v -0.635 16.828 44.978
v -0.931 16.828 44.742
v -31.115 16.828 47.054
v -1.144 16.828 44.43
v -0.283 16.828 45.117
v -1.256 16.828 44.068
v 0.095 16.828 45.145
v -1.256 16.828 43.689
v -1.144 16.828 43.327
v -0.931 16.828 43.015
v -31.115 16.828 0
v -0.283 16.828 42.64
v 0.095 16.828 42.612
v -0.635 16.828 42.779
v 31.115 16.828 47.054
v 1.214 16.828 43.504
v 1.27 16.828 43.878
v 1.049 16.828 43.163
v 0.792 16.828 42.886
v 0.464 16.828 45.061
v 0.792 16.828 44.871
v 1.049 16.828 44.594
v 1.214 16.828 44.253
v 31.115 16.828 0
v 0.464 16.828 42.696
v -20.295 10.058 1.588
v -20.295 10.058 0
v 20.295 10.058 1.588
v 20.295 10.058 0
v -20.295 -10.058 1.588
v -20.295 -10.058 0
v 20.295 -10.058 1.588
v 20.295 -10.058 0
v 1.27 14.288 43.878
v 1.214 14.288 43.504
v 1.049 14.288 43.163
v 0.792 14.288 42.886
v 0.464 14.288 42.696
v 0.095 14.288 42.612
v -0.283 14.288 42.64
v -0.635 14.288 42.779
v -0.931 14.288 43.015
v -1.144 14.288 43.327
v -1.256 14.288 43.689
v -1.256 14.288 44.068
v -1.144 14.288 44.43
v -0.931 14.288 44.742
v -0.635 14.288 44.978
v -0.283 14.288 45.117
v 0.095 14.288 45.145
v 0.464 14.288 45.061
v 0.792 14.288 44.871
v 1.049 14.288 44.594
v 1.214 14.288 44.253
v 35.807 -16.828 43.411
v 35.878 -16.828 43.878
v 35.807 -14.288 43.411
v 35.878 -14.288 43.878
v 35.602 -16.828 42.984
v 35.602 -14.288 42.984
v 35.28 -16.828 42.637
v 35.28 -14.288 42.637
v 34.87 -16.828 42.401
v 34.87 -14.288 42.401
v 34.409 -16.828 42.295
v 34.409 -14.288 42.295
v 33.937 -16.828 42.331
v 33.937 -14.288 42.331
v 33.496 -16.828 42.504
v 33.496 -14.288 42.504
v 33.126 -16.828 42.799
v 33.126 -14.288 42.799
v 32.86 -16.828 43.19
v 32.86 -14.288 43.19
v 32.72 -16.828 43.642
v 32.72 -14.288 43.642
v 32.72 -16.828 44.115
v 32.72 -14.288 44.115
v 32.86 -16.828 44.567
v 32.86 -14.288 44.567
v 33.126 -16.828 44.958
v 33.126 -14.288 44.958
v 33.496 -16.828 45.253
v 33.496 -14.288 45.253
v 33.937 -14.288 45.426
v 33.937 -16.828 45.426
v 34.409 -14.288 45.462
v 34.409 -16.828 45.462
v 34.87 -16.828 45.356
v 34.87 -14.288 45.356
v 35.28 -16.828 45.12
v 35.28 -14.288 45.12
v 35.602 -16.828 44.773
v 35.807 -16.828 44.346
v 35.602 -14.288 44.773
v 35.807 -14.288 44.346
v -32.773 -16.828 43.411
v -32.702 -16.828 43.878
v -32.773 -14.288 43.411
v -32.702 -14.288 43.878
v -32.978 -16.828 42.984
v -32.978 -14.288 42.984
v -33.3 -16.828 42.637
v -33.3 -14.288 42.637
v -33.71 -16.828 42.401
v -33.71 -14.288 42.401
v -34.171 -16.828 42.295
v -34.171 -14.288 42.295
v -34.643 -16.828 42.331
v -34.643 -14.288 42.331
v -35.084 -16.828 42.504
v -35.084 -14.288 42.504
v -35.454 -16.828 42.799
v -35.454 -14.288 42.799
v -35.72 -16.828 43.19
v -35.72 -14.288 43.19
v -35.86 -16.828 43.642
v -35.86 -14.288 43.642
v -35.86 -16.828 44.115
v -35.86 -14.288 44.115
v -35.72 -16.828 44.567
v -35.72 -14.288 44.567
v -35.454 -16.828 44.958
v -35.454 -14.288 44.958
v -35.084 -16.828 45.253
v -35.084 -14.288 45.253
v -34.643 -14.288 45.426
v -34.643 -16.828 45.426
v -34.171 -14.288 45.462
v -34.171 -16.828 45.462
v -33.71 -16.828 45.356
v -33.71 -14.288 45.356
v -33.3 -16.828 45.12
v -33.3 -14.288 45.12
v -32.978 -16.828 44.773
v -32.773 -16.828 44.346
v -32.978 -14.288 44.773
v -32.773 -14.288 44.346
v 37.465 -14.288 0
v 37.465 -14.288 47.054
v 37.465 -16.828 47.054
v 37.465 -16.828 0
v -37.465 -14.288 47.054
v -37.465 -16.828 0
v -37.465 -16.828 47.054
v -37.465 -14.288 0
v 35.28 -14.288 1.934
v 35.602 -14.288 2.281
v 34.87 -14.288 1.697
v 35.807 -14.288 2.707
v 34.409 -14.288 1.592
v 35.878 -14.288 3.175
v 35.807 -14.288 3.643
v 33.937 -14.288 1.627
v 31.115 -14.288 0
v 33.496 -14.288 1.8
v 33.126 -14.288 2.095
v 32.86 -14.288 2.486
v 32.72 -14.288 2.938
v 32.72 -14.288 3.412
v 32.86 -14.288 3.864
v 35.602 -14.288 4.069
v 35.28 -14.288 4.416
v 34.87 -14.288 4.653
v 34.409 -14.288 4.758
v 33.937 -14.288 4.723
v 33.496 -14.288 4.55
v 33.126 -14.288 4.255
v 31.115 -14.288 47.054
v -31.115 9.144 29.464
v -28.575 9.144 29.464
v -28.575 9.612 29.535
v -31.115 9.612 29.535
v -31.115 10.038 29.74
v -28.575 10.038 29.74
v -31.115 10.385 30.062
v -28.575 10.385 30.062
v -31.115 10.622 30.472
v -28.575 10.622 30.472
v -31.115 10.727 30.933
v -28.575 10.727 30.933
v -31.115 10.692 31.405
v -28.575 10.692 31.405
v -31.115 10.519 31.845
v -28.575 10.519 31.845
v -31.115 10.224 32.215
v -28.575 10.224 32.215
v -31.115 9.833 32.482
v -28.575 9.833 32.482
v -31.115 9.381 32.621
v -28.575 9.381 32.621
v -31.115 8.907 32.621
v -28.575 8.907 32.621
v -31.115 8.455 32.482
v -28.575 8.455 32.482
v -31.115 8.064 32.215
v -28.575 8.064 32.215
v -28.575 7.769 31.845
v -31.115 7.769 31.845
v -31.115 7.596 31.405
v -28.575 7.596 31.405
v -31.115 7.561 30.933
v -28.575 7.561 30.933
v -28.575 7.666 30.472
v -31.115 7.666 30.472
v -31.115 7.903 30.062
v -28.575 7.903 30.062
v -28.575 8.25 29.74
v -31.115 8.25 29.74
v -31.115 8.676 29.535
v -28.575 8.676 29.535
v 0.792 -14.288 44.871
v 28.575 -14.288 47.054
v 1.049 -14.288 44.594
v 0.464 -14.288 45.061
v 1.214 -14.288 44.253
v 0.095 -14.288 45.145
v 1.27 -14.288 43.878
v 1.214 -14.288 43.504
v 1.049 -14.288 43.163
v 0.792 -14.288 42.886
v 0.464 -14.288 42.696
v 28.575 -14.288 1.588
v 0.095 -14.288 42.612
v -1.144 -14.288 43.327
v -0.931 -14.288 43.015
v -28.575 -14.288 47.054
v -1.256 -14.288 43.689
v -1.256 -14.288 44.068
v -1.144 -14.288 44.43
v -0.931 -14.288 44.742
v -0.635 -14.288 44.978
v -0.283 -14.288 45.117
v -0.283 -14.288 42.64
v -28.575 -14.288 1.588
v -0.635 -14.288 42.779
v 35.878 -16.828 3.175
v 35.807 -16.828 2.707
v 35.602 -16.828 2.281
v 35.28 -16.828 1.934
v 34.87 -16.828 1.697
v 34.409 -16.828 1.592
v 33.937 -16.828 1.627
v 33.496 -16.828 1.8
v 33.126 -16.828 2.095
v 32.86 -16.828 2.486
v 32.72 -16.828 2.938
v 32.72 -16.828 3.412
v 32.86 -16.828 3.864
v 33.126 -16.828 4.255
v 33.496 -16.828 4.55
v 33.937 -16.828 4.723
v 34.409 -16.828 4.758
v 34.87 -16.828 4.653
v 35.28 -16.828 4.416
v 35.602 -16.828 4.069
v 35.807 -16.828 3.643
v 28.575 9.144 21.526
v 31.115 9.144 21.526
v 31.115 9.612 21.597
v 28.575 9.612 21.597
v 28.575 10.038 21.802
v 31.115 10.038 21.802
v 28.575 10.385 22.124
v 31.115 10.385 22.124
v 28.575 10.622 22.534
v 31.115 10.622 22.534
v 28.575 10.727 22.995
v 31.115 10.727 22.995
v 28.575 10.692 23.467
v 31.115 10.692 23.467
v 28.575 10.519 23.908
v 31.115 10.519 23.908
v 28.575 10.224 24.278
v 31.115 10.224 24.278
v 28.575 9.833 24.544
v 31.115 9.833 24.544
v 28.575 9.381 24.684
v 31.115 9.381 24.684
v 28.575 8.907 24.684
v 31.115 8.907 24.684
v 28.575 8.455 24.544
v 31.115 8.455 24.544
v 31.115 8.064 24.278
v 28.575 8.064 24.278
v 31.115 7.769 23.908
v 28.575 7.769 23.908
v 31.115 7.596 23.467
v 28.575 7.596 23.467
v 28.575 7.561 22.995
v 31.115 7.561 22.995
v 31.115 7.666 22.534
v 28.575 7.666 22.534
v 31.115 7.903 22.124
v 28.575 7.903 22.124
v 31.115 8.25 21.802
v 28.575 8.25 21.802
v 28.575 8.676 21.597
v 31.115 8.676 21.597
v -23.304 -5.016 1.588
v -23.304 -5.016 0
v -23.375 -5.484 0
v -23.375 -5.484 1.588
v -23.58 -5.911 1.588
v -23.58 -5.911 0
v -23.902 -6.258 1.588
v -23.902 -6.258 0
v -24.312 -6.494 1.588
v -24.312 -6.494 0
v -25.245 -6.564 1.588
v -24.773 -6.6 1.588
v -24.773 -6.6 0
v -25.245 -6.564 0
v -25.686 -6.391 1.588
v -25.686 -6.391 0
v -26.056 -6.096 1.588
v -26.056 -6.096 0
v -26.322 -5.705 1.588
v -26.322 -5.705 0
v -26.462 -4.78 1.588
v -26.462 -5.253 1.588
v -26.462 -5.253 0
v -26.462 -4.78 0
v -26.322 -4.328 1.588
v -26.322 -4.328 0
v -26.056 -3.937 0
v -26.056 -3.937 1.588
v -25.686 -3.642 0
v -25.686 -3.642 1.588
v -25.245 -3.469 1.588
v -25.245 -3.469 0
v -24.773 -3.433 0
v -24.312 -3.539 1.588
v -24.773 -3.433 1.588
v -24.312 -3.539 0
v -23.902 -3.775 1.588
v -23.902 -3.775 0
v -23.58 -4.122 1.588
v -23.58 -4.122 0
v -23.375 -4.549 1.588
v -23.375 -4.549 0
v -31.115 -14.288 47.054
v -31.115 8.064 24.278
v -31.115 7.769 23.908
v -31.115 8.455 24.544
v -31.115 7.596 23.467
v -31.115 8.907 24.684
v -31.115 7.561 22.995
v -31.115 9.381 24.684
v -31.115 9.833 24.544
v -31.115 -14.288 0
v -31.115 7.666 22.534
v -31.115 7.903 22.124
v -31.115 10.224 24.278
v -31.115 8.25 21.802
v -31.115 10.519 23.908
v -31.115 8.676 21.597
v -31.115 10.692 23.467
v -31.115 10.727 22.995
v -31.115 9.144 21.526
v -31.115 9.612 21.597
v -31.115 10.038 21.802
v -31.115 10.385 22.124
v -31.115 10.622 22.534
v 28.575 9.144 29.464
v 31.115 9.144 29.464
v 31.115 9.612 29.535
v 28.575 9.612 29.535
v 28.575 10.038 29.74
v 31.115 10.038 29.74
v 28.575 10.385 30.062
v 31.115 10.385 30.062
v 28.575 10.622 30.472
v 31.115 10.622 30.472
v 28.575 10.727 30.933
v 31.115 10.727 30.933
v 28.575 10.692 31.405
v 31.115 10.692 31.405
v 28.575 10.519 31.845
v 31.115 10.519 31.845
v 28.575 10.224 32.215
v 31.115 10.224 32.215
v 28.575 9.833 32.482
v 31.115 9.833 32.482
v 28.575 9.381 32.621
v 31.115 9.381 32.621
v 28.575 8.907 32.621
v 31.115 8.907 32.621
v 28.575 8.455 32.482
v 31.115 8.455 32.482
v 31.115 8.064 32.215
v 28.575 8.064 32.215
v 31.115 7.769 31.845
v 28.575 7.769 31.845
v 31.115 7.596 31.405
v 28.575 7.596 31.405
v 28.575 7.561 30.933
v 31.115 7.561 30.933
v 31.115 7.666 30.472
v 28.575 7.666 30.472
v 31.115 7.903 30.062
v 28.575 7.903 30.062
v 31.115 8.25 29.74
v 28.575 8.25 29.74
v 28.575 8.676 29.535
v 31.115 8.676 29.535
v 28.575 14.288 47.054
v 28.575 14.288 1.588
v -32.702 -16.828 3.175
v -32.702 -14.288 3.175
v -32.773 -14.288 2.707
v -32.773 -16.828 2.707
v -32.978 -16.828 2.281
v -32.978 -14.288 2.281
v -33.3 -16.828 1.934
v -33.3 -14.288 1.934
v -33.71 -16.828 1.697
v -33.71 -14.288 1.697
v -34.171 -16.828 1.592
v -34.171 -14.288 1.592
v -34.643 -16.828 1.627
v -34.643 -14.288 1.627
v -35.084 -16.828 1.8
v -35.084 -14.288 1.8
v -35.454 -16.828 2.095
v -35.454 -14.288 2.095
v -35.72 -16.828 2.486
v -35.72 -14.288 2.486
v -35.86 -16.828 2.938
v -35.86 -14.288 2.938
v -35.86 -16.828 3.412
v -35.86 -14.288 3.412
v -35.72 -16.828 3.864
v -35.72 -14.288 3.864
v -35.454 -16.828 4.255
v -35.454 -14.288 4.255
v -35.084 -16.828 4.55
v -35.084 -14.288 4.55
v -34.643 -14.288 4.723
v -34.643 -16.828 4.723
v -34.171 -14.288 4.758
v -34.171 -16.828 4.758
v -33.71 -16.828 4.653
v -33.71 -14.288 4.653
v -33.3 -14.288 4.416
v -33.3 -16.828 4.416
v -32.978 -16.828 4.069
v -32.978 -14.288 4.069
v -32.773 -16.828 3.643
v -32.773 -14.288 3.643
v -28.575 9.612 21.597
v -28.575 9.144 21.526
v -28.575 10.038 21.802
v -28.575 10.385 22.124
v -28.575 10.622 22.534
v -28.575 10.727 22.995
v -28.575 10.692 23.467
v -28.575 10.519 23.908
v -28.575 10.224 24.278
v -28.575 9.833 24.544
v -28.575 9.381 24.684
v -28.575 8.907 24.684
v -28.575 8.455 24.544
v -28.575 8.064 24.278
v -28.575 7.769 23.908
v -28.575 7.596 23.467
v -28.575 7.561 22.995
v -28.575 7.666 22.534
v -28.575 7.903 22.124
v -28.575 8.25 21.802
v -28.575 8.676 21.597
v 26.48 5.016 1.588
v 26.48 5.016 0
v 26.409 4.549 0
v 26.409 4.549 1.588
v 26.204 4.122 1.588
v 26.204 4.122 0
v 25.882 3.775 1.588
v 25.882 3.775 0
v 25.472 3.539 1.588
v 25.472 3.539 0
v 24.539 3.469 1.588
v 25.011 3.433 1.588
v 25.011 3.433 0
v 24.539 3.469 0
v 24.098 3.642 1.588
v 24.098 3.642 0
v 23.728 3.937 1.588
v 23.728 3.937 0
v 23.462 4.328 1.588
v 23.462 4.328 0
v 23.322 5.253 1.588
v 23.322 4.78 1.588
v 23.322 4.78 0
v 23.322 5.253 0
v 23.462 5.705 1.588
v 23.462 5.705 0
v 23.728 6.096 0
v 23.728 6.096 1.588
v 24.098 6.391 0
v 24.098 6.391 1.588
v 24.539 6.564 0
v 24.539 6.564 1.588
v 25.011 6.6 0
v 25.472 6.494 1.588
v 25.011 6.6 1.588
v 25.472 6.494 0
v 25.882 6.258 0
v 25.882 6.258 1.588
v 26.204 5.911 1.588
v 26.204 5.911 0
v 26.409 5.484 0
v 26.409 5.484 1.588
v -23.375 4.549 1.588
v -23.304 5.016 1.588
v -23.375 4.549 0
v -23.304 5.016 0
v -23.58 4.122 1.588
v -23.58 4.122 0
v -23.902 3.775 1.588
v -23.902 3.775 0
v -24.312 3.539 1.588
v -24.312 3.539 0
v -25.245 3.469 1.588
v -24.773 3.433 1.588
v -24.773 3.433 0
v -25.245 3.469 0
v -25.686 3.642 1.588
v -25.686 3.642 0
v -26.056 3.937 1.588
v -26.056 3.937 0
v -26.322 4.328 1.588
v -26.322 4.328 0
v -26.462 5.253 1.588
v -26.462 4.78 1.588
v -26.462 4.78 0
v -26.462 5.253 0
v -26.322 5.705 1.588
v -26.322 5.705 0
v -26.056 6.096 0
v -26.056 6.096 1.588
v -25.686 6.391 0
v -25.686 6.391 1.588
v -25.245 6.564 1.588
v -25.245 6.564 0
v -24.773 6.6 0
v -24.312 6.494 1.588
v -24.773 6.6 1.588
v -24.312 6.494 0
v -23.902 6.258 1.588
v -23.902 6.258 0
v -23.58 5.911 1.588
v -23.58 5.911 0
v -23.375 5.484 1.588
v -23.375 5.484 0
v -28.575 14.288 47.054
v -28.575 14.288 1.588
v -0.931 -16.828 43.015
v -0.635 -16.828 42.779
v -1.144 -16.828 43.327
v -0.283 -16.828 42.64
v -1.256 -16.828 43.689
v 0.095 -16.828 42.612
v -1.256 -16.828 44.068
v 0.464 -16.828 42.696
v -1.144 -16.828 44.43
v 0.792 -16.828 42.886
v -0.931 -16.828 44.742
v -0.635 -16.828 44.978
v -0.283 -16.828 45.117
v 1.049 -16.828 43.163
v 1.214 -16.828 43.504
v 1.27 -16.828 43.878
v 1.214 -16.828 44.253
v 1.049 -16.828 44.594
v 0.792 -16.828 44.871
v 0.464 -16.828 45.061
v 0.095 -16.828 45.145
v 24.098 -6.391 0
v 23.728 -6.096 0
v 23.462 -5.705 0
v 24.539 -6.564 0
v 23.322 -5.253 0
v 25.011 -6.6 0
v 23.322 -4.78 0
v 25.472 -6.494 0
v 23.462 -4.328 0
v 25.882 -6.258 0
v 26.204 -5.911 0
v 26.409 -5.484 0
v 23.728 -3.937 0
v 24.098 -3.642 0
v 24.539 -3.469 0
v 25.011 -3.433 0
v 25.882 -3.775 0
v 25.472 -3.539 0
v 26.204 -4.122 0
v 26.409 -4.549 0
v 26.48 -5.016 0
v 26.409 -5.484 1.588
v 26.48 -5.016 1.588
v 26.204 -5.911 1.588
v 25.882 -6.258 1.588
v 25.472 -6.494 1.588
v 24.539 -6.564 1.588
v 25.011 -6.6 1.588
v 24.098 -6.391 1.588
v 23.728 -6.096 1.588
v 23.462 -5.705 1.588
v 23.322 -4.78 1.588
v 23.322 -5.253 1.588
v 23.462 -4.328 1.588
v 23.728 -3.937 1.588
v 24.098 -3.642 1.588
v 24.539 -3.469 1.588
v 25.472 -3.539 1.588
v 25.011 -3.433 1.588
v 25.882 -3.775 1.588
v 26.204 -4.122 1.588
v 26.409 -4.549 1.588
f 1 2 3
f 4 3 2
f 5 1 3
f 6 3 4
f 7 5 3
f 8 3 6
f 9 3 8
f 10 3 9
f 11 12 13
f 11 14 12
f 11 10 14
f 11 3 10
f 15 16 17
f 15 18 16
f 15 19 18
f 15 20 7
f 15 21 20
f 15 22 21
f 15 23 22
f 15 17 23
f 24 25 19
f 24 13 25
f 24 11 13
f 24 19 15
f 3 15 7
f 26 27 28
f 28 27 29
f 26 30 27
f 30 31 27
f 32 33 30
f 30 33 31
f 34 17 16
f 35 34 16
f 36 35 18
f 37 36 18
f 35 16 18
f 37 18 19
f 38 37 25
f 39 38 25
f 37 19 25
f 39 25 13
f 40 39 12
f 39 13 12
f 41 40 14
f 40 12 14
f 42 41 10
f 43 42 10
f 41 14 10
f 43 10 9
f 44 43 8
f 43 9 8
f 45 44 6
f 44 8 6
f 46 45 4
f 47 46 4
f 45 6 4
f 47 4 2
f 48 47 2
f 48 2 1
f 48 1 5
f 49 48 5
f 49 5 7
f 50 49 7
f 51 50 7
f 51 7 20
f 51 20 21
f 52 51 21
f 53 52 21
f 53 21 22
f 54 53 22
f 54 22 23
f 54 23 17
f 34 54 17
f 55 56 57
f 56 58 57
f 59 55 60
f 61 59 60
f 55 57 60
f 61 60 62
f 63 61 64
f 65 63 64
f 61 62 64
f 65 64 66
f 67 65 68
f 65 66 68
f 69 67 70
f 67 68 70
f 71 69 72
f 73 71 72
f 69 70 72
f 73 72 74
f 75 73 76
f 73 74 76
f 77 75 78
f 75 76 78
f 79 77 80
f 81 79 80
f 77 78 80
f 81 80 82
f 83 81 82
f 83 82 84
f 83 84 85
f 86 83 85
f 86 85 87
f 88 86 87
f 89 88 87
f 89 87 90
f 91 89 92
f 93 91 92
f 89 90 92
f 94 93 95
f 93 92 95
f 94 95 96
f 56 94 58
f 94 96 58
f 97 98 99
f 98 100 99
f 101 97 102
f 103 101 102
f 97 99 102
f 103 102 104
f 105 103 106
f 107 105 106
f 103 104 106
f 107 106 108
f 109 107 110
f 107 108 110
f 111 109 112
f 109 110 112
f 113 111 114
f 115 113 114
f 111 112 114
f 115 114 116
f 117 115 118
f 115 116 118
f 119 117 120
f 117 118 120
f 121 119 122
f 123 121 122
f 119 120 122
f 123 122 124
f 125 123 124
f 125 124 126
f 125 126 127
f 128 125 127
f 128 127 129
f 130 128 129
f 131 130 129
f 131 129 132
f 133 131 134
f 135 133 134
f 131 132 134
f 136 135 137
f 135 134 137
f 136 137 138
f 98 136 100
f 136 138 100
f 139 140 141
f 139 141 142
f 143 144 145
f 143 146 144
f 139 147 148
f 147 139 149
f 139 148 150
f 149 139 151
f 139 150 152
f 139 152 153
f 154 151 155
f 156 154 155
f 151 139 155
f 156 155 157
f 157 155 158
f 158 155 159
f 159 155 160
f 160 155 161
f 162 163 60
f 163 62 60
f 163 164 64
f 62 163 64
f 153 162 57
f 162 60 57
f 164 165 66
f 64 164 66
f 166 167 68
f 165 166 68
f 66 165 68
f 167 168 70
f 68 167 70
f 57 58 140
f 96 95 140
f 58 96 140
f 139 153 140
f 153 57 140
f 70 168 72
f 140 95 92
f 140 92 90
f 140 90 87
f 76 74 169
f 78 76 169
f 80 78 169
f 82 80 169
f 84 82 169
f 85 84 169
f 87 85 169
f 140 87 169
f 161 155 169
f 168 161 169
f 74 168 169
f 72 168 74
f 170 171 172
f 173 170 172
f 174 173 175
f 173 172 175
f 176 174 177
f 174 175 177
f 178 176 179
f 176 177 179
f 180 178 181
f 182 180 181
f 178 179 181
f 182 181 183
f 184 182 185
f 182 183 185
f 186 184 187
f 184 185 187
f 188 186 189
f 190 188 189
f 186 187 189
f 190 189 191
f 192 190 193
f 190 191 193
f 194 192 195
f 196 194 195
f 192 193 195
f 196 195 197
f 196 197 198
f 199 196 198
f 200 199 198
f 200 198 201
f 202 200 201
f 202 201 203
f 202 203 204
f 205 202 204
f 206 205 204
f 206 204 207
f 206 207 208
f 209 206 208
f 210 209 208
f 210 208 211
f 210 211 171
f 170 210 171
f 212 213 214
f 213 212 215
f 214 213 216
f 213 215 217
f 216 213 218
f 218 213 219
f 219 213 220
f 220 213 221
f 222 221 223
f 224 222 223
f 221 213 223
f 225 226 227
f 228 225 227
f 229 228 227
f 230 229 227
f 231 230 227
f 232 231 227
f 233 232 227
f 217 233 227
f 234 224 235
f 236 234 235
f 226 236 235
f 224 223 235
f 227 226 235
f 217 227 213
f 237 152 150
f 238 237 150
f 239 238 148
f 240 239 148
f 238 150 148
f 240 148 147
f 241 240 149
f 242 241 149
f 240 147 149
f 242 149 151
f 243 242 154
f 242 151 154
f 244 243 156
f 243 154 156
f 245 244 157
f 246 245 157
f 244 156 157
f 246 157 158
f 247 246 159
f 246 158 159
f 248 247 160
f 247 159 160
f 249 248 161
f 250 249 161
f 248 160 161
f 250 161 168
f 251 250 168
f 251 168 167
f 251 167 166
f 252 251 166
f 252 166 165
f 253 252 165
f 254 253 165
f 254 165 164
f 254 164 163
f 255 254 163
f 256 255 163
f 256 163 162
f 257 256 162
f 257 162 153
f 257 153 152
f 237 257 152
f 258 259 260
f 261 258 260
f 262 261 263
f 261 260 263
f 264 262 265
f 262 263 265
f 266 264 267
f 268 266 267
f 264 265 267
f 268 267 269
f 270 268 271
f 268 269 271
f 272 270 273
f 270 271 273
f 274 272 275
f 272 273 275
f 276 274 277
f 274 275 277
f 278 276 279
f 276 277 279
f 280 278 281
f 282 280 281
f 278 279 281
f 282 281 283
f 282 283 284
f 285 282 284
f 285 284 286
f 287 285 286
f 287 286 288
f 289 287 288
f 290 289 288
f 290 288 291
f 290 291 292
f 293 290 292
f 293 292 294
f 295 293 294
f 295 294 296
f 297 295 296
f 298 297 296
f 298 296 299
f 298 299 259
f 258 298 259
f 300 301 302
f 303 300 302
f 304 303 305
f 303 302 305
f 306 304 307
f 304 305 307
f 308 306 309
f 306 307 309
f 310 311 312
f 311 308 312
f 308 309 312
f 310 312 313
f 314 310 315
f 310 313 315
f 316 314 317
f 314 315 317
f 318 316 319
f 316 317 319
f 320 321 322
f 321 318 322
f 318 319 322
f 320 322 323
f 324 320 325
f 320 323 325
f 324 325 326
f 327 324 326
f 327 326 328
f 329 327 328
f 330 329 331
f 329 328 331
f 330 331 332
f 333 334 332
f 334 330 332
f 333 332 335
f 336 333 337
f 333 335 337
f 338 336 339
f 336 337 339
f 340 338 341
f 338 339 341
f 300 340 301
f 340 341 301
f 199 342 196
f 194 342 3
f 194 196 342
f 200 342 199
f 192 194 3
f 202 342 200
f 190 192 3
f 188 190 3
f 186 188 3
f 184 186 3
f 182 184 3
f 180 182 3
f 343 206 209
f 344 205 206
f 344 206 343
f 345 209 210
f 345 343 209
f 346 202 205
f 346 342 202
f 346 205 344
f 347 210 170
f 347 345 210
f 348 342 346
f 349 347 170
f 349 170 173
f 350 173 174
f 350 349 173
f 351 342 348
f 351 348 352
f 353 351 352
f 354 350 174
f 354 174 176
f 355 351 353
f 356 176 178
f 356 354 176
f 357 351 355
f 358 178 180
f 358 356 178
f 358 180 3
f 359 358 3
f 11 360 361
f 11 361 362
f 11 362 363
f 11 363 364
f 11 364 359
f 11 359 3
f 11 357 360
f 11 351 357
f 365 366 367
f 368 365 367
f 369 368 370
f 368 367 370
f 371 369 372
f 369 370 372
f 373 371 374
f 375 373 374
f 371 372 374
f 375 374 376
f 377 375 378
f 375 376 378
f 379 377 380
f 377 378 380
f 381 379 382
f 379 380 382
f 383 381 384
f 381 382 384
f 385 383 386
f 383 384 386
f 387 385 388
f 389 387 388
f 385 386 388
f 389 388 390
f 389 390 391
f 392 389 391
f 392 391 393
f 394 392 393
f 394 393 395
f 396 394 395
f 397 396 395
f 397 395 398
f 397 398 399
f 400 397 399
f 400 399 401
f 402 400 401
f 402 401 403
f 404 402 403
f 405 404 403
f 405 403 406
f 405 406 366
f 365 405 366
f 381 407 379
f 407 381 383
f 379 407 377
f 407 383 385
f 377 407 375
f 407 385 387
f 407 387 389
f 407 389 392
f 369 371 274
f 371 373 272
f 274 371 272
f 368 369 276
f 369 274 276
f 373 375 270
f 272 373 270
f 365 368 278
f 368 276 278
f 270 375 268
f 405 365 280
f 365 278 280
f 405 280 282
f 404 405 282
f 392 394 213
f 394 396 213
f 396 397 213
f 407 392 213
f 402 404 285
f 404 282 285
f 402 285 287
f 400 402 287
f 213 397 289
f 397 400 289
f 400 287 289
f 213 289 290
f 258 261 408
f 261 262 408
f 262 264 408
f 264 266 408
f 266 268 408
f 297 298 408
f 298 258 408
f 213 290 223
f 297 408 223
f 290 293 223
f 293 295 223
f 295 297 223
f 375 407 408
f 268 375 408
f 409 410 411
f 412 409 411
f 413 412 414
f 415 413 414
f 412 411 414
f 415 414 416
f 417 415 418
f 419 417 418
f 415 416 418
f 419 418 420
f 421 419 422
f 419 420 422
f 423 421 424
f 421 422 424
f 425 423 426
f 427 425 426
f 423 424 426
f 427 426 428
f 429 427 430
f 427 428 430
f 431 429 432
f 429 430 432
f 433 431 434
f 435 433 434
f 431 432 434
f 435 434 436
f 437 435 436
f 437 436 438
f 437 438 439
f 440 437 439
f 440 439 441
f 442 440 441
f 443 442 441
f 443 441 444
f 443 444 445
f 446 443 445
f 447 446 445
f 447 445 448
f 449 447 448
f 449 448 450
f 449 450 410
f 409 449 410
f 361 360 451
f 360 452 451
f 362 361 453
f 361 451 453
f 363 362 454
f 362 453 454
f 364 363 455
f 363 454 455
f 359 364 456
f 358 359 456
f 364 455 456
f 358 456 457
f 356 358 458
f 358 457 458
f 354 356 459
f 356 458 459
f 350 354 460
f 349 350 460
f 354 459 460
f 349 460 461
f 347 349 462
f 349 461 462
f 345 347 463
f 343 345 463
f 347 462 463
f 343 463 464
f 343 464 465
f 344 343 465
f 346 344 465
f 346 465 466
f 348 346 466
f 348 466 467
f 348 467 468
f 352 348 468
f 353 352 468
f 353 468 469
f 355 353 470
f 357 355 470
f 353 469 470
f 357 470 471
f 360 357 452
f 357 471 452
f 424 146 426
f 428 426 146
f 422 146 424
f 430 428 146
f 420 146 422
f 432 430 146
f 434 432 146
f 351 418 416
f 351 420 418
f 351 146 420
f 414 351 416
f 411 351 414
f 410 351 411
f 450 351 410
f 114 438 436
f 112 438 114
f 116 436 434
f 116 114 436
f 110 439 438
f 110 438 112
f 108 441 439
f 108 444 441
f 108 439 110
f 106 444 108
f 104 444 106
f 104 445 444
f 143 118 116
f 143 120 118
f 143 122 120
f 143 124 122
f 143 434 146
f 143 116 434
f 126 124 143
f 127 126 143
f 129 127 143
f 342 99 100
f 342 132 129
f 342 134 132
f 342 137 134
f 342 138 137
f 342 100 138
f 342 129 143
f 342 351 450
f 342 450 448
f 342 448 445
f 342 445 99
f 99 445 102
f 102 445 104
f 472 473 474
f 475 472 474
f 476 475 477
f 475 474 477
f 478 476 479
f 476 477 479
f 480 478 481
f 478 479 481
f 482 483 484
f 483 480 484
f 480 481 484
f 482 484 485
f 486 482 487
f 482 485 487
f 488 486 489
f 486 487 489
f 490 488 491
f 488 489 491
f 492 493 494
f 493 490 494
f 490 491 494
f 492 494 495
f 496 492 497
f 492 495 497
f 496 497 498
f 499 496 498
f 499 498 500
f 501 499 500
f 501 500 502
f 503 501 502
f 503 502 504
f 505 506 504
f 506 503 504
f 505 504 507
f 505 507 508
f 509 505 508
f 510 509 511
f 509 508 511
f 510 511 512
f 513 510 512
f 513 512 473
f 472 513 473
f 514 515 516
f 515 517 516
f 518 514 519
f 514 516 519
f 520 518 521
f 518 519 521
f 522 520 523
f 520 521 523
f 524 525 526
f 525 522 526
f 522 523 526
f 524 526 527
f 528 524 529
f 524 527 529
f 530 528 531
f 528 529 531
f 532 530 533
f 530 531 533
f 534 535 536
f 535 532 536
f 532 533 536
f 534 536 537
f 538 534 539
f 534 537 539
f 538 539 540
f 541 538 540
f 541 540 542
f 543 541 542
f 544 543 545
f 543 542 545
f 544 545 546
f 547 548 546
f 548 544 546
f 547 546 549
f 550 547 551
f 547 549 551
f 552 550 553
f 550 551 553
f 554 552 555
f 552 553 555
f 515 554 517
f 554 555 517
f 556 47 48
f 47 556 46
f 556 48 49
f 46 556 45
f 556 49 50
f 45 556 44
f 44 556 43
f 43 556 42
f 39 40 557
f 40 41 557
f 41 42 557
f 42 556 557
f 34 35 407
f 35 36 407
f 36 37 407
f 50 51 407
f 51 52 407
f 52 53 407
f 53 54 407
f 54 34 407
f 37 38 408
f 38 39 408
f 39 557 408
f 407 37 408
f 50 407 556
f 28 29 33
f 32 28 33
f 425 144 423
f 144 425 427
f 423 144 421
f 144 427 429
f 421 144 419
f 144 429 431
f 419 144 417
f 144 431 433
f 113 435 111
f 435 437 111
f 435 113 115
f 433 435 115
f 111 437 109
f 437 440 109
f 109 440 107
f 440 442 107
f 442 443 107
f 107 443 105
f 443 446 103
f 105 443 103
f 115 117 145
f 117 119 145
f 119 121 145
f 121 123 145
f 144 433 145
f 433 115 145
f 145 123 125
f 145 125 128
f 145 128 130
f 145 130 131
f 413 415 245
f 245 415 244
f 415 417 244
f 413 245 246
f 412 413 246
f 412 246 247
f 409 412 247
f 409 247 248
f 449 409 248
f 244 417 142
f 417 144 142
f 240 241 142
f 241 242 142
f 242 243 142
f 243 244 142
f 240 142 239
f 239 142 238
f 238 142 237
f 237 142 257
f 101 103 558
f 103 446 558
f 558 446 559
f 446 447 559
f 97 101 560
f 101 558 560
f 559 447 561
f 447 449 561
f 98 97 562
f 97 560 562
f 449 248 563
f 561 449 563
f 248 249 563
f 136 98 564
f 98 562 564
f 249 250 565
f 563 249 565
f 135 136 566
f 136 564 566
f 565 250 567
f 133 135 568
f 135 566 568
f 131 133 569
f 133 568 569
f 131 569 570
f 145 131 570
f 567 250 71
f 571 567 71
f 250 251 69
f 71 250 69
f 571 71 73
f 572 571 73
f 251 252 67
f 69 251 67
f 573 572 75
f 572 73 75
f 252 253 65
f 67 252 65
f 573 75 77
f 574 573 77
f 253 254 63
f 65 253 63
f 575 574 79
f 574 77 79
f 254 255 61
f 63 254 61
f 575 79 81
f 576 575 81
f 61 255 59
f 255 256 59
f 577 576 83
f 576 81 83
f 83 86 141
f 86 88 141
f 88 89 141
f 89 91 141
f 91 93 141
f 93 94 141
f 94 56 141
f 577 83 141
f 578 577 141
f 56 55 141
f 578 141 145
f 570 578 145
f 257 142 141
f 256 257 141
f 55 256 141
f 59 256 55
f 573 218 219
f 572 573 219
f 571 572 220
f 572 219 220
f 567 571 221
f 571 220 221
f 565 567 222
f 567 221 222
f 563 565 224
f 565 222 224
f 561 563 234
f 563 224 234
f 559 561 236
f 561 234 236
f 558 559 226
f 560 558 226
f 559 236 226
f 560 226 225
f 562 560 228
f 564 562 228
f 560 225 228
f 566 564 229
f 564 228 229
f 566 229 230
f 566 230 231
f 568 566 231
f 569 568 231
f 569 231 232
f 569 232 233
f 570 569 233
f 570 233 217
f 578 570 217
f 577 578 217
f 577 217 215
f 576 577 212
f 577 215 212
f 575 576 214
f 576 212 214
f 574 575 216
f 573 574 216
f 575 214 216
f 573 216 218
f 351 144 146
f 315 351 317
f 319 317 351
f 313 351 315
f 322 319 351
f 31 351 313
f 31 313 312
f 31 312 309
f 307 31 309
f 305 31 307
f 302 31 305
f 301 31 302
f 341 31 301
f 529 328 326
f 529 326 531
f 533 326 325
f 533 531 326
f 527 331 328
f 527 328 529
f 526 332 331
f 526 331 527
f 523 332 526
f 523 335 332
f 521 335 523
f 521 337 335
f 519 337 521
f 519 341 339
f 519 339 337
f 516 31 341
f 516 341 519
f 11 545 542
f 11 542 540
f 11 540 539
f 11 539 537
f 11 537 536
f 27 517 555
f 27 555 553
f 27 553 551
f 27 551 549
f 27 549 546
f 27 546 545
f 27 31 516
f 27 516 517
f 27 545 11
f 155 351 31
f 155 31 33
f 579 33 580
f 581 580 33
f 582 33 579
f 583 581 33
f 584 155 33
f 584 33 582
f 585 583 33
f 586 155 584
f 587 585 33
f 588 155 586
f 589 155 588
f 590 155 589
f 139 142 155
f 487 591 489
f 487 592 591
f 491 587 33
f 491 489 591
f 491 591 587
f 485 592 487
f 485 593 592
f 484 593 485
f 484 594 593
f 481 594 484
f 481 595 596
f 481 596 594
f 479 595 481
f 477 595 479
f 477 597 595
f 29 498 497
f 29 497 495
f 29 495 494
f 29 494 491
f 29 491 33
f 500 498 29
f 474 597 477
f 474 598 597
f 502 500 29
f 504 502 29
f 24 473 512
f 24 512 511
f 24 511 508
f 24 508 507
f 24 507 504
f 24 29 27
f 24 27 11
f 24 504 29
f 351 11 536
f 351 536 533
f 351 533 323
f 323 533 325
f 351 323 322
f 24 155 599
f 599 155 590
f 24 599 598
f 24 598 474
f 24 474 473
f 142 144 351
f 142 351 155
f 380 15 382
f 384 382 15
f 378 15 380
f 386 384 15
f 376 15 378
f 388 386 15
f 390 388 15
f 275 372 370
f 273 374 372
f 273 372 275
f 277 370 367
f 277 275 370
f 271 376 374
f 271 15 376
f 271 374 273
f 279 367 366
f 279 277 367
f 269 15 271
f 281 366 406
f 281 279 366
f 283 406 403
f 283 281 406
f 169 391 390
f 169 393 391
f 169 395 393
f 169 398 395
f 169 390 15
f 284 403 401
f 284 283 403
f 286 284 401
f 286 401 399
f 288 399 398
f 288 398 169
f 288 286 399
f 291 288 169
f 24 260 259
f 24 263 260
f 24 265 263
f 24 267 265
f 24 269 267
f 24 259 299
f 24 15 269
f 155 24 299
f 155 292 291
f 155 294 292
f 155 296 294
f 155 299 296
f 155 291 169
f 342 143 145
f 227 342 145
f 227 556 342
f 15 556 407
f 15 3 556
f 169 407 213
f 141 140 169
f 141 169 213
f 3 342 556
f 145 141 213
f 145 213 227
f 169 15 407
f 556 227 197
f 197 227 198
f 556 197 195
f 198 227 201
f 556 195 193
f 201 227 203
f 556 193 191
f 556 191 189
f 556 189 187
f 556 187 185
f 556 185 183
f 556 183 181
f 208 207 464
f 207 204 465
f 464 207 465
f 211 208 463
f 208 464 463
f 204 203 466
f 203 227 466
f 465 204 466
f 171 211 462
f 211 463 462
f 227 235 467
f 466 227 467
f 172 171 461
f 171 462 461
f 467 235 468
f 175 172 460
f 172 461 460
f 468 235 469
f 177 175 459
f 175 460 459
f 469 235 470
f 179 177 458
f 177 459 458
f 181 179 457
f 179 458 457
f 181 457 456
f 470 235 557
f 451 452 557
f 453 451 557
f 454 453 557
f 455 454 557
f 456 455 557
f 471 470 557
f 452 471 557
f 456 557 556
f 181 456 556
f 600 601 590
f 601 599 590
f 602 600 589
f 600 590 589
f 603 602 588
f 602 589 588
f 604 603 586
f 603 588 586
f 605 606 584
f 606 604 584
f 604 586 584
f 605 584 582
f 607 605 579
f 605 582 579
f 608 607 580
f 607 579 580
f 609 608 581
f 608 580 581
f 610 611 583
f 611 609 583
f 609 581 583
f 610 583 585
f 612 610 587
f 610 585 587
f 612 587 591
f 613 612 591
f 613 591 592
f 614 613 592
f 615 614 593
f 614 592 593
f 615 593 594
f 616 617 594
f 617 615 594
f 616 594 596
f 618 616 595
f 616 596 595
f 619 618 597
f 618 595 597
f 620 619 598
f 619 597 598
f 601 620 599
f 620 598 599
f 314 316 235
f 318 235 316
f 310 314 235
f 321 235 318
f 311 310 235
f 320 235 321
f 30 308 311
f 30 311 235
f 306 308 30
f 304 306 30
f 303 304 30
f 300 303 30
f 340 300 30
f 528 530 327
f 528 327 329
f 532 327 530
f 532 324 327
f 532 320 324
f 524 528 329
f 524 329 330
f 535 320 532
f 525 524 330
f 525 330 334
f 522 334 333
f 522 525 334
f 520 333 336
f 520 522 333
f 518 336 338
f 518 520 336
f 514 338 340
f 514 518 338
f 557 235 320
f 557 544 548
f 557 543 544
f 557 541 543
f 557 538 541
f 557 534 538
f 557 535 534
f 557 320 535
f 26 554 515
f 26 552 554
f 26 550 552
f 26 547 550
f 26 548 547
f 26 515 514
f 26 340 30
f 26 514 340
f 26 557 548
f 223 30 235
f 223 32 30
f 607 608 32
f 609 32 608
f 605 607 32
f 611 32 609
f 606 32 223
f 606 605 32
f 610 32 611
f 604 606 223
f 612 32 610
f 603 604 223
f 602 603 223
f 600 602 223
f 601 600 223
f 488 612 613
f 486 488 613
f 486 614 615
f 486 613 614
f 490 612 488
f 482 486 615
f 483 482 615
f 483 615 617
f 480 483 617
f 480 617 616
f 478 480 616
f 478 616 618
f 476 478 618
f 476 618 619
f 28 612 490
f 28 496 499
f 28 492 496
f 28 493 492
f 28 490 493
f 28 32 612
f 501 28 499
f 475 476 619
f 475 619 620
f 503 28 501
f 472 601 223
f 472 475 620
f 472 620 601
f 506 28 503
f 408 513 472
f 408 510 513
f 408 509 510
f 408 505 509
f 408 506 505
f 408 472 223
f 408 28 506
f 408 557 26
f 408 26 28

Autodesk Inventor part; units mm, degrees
ref_plane "YZ Plane" through (0, 0, 0) normal (1, 0, 0) x (0, 1, 0)
ref_plane "XZ Plane" through (0, 0, 0) normal (0, 1, 0) x (-1, 0, 0)
ref_plane "XY Plane" through (0, 0, 0) normal (0, 0, 1) x (1, 0, 0)
sketch "Sketch1" plane through (0, 0, 0) normal (0, 0, 1) x (1, 0, 0)
  line L0 (-20.2946, 10.0584) -> (20.2946, 10.0584)
  line L1 (20.2946, 10.0584) -> (20.2946, -10.0584)
  line L2 (20.2946, -10.0584) -> (-20.2946, -10.0584)
  line L3 (-20.2946, -10.0584) -> (-20.2946, 10.0584)
  line L4 (-31.115, 16.8275) -> (31.115, 16.8275)
  line L5 (31.115, 16.8275) -> (31.115, -16.8275)
  line L6 (31.115, -16.8275) -> (-31.115, -16.8275)
  line L7 (-31.115, -16.8275) -> (-31.115, 16.8275)
  circle A0 centre (-24.892, 5.0165) radius 1.5875
  line L8 (0, 0) -> (0, 25.203) construction
  line L9 (0, 0) -> (-28.0291, 0) construction
  circle A1 centre (24.892, 5.0165) radius 1.5875
  line L10 (0, 0) -> (41.5268, 0) construction
  circle A2 centre (-24.892, -5.0165) radius 1.5875
  circle A3 centre (24.892, -5.0165) radius 1.5875
  dimension "d0" = 40.5892
  dimension "d1" = 20.1168
  dimension "d2" = 20.2946
  dimension "d3" = 10.0584
  dimension "d4" = 62.23
  dimension "d5" = 33.655
  dimension "d6" = 16.8275
  dimension "d7" = 31.115
  dimension "d8" = 3.175
  dimension "d9" = 24.892
  dimension "d10" = 5.0165
extrude "Extrusion1" add sketch "Sketch1" along normal blind 1.5875
sketch "Sketch2" plane through (0, 0, 1.5875) normal (0, 0, 1) x (1, 0, 0)
  line L0 (31.115, 16.8275) -> (-31.115, 16.8275) projected
  line L1 (-31.115, 16.8275) -> (-31.115, -16.8275) projected
  line L2 (-31.115, -16.8275) -> (31.115, -16.8275) projected
  line L3 (31.115, -16.8275) -> (31.115, 16.8275) projected
  line L4 (-28.575, 14.2875) -> (28.575, 14.2875)
  line L5 (28.575, 14.2875) -> (28.575, -14.2875)
  line L6 (28.575, -14.2875) -> (-28.575, -14.2875)
  line L7 (-28.575, -14.2875) -> (-28.575, 14.2875)
  point P0 (0, 0)
  dimension "d13" = 57.15
  dimension "d14" = 28.575
  dimension "d15" = 28.575
  dimension "d16" = 14.2875
extrude "Extrusion2" add sketch "Sketch2" along normal blind 45.466
sketch "Sketch3" plane through (31.115, -16.8275, 0) normal (1, 0, 0) x (0, 0, -1)
  circle A0 centre (-23.114, 25.9715) radius 1.5875
  circle A1 centre (-31.0515, 25.9715) radius 1.5875
  point P0 (0, 16.8275)
  dimension "d19" = 3.175
  dimension "d20" = 9.144
  dimension "d21" = 23.114
  dimension "d22" = 3.175
  dimension "d23" = 9.144
  dimension "d24" = 7.9375
extrude "Extrusion3" cut sketch "Sketch3" against normal through all
sketch "Sketch4" plane through (31.115, -16.8275, 0) normal (1, 0, 0) x (0, 0, -1)
  line L0 (0, 0) -> (0, 33.655) projected
  line L1 (-47.0535, 0) -> (0, 0)
  line L2 (0, 0) -> (0, 2.54)
  line L3 (0, 2.54) -> (-47.0535, 2.54)
  line L4 (-47.0535, 2.54) -> (-47.0535, 0)
  point P0 (0, 16.8275)
  dimension "d27" = 2.54
extrude "Extrusion4" add sketch "Sketch4" along normal blind 6.35
sketch "Sketch5" plane through (31.115, -14.2875, 47.0535) normal (0, 1, 0) x (1, 0, 0)
  circle A0 centre (3.175, 3.175) radius 1.5875
  line L0 (0, 0) -> (6.35, 0) projected
  line L1 (6.35, 47.0535) -> (6.35, 0) projected
  circle A1 centre (3.175, 43.8785) radius 1.5875
  point P0 (-31.115, 47.0535)
  dimension "d30" = 3.175
  dimension "d31" = 3.175
  dimension "d32" = 3.175
  dimension "d33" = 3.175
  dimension "d34" = 3.175
  dimension "d35" = 3.175
extrude "Extrusion5" cut sketch "Sketch5" against normal blind 6.35
sketch "Sketch6" plane through (-31.115, -16.8275, 0) normal (-1, 0, 0) x (0, 0, 1)
  line L0 (0, 0) -> (47.0535, 0) projected
  line L1 (0, 0) -> (0, 2.54)
  line L2 (0, 0) -> (0, 33.655) projected
  line L3 (0, 2.54) -> (47.0535, 2.54)
  line L4 (47.0535, 2.54) -> (47.0535, 0)
  point P0 (0, 16.8275)
  dimension "d38" = 2.54
extrude "Extrusion6" add sketch "Sketch6" along normal blind 6.35
sketch "Sketch7" plane through (-31.115, -14.2875, 47.0535) normal (0, 1, 0) x (1, 0, 0)
  circle A0 centre (-3.175, 43.8785) radius 1.5875
  circle A1 centre (-3.175, 3.175) radius 1.5875
  line L0 (-6.35, 0) -> (-6.35, 47.0535) projected
  point P0 (31.115, 47.0535)
  dimension "d41" = 3.175
  dimension "d42" = 3.175
  dimension "d43" = 3.175
  dimension "d44" = 3.175
  dimension "d45" = 3.175
  dimension "d46" = 3.175
extrude "Extrusion7" cut sketch "Sketch7" against normal blind 6.35
sketch "Sketch8" plane through (-31.115, 16.8275, 0) normal (0, 1, 0) x (1, 0, 0)
  line L0 (62.23, -47.0535) -> (0, -47.0535) projected
  circle A0 centre (31.115, -43.8785) radius 1.27
  point P0 (31.115, 0)
  dimension "d49" = 2.54
  dimension "d50" = 3.175
  dimension "d51" = 31.115
extrude "Extrusion8" cut sketch "Sketch8" against normal through all
equation "\"d0\" = servL"
equation "\"d1\" = servW"
equation "\"d2\" = 0.5 * servL"
equation "\"d3\" = 0.5 * servW"
equation "\"d4\" = housL + 2 * housT"
equation "\"d5\" = housW + 2 * housT"
equation "\"d6\" = housT + 0.5 * housW"
equation "\"d7\" = housT + 0.5 * housL"
equation "\"d8\" = servMD"
equation "\"d9\" = 0.5 * servML"
equation "\"d10\" = 0.5 * servMW"
equation "\"d11\" = housBT"
equation "\"d13\" = housL"
equation "\"d14\" = housW"
equation "\"d15\" = 0.5 * housL"
equation "\"d16\" = 0.5 * housW"
equation "\"d17\" = housH"
equation "\"d19\" = guideD"
equation "\"d20\" = guideW"
equation "\"d21\" = guideH"
equation "\"d22\" = guideD"
equation "\"d23\" = guideW"
equation "\"d24\" = hubH + spoolT"
equation "\"d25\" = housT"
equation "\"d27\" = housT"
equation "\"d38\" = housT"
equation "\"d51\" = 0.5 * housL + housT"
equation "\"spoolD\" = 25.4"
equation "\"hubD\" = 6.35"
equation "\"spoolT\" = 1.5875"
equation "\"hubH\" = 6.35"
equation "\"hornD\" = 25.4"
equation "\"hornT\" = 1.5875"
equation "\"hornS\" = 2.794"
equation "\"hornID\" = 6.096"
equation "\"hornOD\" = 8.89"
equation "\"hornH\" = 2.54"
equation "\"inset\" = 2.032"
equation "\"insetD\" = 5.842"
equation "\"servW\" = 20.1168"
equation "\"servL\" = 40.5892"
equation "\"servML\" = 49.784"
equation "\"servMW\" = 10.033"
equation "\"servMD\" = 3.175"
equation "\"housW\" = 28.575"
equation "\"housL\" = 57.15"
equation "\"housT\" = 2.54"
equation "\"housBT\" = 1.5875"
equation "\"housH\" = 45.466"
equation "\"guideD\" = 3.175"
equation "\"guideH\" = 23.114"
equation "\"guideW\" = 9.144"
properties part number "Housing"
